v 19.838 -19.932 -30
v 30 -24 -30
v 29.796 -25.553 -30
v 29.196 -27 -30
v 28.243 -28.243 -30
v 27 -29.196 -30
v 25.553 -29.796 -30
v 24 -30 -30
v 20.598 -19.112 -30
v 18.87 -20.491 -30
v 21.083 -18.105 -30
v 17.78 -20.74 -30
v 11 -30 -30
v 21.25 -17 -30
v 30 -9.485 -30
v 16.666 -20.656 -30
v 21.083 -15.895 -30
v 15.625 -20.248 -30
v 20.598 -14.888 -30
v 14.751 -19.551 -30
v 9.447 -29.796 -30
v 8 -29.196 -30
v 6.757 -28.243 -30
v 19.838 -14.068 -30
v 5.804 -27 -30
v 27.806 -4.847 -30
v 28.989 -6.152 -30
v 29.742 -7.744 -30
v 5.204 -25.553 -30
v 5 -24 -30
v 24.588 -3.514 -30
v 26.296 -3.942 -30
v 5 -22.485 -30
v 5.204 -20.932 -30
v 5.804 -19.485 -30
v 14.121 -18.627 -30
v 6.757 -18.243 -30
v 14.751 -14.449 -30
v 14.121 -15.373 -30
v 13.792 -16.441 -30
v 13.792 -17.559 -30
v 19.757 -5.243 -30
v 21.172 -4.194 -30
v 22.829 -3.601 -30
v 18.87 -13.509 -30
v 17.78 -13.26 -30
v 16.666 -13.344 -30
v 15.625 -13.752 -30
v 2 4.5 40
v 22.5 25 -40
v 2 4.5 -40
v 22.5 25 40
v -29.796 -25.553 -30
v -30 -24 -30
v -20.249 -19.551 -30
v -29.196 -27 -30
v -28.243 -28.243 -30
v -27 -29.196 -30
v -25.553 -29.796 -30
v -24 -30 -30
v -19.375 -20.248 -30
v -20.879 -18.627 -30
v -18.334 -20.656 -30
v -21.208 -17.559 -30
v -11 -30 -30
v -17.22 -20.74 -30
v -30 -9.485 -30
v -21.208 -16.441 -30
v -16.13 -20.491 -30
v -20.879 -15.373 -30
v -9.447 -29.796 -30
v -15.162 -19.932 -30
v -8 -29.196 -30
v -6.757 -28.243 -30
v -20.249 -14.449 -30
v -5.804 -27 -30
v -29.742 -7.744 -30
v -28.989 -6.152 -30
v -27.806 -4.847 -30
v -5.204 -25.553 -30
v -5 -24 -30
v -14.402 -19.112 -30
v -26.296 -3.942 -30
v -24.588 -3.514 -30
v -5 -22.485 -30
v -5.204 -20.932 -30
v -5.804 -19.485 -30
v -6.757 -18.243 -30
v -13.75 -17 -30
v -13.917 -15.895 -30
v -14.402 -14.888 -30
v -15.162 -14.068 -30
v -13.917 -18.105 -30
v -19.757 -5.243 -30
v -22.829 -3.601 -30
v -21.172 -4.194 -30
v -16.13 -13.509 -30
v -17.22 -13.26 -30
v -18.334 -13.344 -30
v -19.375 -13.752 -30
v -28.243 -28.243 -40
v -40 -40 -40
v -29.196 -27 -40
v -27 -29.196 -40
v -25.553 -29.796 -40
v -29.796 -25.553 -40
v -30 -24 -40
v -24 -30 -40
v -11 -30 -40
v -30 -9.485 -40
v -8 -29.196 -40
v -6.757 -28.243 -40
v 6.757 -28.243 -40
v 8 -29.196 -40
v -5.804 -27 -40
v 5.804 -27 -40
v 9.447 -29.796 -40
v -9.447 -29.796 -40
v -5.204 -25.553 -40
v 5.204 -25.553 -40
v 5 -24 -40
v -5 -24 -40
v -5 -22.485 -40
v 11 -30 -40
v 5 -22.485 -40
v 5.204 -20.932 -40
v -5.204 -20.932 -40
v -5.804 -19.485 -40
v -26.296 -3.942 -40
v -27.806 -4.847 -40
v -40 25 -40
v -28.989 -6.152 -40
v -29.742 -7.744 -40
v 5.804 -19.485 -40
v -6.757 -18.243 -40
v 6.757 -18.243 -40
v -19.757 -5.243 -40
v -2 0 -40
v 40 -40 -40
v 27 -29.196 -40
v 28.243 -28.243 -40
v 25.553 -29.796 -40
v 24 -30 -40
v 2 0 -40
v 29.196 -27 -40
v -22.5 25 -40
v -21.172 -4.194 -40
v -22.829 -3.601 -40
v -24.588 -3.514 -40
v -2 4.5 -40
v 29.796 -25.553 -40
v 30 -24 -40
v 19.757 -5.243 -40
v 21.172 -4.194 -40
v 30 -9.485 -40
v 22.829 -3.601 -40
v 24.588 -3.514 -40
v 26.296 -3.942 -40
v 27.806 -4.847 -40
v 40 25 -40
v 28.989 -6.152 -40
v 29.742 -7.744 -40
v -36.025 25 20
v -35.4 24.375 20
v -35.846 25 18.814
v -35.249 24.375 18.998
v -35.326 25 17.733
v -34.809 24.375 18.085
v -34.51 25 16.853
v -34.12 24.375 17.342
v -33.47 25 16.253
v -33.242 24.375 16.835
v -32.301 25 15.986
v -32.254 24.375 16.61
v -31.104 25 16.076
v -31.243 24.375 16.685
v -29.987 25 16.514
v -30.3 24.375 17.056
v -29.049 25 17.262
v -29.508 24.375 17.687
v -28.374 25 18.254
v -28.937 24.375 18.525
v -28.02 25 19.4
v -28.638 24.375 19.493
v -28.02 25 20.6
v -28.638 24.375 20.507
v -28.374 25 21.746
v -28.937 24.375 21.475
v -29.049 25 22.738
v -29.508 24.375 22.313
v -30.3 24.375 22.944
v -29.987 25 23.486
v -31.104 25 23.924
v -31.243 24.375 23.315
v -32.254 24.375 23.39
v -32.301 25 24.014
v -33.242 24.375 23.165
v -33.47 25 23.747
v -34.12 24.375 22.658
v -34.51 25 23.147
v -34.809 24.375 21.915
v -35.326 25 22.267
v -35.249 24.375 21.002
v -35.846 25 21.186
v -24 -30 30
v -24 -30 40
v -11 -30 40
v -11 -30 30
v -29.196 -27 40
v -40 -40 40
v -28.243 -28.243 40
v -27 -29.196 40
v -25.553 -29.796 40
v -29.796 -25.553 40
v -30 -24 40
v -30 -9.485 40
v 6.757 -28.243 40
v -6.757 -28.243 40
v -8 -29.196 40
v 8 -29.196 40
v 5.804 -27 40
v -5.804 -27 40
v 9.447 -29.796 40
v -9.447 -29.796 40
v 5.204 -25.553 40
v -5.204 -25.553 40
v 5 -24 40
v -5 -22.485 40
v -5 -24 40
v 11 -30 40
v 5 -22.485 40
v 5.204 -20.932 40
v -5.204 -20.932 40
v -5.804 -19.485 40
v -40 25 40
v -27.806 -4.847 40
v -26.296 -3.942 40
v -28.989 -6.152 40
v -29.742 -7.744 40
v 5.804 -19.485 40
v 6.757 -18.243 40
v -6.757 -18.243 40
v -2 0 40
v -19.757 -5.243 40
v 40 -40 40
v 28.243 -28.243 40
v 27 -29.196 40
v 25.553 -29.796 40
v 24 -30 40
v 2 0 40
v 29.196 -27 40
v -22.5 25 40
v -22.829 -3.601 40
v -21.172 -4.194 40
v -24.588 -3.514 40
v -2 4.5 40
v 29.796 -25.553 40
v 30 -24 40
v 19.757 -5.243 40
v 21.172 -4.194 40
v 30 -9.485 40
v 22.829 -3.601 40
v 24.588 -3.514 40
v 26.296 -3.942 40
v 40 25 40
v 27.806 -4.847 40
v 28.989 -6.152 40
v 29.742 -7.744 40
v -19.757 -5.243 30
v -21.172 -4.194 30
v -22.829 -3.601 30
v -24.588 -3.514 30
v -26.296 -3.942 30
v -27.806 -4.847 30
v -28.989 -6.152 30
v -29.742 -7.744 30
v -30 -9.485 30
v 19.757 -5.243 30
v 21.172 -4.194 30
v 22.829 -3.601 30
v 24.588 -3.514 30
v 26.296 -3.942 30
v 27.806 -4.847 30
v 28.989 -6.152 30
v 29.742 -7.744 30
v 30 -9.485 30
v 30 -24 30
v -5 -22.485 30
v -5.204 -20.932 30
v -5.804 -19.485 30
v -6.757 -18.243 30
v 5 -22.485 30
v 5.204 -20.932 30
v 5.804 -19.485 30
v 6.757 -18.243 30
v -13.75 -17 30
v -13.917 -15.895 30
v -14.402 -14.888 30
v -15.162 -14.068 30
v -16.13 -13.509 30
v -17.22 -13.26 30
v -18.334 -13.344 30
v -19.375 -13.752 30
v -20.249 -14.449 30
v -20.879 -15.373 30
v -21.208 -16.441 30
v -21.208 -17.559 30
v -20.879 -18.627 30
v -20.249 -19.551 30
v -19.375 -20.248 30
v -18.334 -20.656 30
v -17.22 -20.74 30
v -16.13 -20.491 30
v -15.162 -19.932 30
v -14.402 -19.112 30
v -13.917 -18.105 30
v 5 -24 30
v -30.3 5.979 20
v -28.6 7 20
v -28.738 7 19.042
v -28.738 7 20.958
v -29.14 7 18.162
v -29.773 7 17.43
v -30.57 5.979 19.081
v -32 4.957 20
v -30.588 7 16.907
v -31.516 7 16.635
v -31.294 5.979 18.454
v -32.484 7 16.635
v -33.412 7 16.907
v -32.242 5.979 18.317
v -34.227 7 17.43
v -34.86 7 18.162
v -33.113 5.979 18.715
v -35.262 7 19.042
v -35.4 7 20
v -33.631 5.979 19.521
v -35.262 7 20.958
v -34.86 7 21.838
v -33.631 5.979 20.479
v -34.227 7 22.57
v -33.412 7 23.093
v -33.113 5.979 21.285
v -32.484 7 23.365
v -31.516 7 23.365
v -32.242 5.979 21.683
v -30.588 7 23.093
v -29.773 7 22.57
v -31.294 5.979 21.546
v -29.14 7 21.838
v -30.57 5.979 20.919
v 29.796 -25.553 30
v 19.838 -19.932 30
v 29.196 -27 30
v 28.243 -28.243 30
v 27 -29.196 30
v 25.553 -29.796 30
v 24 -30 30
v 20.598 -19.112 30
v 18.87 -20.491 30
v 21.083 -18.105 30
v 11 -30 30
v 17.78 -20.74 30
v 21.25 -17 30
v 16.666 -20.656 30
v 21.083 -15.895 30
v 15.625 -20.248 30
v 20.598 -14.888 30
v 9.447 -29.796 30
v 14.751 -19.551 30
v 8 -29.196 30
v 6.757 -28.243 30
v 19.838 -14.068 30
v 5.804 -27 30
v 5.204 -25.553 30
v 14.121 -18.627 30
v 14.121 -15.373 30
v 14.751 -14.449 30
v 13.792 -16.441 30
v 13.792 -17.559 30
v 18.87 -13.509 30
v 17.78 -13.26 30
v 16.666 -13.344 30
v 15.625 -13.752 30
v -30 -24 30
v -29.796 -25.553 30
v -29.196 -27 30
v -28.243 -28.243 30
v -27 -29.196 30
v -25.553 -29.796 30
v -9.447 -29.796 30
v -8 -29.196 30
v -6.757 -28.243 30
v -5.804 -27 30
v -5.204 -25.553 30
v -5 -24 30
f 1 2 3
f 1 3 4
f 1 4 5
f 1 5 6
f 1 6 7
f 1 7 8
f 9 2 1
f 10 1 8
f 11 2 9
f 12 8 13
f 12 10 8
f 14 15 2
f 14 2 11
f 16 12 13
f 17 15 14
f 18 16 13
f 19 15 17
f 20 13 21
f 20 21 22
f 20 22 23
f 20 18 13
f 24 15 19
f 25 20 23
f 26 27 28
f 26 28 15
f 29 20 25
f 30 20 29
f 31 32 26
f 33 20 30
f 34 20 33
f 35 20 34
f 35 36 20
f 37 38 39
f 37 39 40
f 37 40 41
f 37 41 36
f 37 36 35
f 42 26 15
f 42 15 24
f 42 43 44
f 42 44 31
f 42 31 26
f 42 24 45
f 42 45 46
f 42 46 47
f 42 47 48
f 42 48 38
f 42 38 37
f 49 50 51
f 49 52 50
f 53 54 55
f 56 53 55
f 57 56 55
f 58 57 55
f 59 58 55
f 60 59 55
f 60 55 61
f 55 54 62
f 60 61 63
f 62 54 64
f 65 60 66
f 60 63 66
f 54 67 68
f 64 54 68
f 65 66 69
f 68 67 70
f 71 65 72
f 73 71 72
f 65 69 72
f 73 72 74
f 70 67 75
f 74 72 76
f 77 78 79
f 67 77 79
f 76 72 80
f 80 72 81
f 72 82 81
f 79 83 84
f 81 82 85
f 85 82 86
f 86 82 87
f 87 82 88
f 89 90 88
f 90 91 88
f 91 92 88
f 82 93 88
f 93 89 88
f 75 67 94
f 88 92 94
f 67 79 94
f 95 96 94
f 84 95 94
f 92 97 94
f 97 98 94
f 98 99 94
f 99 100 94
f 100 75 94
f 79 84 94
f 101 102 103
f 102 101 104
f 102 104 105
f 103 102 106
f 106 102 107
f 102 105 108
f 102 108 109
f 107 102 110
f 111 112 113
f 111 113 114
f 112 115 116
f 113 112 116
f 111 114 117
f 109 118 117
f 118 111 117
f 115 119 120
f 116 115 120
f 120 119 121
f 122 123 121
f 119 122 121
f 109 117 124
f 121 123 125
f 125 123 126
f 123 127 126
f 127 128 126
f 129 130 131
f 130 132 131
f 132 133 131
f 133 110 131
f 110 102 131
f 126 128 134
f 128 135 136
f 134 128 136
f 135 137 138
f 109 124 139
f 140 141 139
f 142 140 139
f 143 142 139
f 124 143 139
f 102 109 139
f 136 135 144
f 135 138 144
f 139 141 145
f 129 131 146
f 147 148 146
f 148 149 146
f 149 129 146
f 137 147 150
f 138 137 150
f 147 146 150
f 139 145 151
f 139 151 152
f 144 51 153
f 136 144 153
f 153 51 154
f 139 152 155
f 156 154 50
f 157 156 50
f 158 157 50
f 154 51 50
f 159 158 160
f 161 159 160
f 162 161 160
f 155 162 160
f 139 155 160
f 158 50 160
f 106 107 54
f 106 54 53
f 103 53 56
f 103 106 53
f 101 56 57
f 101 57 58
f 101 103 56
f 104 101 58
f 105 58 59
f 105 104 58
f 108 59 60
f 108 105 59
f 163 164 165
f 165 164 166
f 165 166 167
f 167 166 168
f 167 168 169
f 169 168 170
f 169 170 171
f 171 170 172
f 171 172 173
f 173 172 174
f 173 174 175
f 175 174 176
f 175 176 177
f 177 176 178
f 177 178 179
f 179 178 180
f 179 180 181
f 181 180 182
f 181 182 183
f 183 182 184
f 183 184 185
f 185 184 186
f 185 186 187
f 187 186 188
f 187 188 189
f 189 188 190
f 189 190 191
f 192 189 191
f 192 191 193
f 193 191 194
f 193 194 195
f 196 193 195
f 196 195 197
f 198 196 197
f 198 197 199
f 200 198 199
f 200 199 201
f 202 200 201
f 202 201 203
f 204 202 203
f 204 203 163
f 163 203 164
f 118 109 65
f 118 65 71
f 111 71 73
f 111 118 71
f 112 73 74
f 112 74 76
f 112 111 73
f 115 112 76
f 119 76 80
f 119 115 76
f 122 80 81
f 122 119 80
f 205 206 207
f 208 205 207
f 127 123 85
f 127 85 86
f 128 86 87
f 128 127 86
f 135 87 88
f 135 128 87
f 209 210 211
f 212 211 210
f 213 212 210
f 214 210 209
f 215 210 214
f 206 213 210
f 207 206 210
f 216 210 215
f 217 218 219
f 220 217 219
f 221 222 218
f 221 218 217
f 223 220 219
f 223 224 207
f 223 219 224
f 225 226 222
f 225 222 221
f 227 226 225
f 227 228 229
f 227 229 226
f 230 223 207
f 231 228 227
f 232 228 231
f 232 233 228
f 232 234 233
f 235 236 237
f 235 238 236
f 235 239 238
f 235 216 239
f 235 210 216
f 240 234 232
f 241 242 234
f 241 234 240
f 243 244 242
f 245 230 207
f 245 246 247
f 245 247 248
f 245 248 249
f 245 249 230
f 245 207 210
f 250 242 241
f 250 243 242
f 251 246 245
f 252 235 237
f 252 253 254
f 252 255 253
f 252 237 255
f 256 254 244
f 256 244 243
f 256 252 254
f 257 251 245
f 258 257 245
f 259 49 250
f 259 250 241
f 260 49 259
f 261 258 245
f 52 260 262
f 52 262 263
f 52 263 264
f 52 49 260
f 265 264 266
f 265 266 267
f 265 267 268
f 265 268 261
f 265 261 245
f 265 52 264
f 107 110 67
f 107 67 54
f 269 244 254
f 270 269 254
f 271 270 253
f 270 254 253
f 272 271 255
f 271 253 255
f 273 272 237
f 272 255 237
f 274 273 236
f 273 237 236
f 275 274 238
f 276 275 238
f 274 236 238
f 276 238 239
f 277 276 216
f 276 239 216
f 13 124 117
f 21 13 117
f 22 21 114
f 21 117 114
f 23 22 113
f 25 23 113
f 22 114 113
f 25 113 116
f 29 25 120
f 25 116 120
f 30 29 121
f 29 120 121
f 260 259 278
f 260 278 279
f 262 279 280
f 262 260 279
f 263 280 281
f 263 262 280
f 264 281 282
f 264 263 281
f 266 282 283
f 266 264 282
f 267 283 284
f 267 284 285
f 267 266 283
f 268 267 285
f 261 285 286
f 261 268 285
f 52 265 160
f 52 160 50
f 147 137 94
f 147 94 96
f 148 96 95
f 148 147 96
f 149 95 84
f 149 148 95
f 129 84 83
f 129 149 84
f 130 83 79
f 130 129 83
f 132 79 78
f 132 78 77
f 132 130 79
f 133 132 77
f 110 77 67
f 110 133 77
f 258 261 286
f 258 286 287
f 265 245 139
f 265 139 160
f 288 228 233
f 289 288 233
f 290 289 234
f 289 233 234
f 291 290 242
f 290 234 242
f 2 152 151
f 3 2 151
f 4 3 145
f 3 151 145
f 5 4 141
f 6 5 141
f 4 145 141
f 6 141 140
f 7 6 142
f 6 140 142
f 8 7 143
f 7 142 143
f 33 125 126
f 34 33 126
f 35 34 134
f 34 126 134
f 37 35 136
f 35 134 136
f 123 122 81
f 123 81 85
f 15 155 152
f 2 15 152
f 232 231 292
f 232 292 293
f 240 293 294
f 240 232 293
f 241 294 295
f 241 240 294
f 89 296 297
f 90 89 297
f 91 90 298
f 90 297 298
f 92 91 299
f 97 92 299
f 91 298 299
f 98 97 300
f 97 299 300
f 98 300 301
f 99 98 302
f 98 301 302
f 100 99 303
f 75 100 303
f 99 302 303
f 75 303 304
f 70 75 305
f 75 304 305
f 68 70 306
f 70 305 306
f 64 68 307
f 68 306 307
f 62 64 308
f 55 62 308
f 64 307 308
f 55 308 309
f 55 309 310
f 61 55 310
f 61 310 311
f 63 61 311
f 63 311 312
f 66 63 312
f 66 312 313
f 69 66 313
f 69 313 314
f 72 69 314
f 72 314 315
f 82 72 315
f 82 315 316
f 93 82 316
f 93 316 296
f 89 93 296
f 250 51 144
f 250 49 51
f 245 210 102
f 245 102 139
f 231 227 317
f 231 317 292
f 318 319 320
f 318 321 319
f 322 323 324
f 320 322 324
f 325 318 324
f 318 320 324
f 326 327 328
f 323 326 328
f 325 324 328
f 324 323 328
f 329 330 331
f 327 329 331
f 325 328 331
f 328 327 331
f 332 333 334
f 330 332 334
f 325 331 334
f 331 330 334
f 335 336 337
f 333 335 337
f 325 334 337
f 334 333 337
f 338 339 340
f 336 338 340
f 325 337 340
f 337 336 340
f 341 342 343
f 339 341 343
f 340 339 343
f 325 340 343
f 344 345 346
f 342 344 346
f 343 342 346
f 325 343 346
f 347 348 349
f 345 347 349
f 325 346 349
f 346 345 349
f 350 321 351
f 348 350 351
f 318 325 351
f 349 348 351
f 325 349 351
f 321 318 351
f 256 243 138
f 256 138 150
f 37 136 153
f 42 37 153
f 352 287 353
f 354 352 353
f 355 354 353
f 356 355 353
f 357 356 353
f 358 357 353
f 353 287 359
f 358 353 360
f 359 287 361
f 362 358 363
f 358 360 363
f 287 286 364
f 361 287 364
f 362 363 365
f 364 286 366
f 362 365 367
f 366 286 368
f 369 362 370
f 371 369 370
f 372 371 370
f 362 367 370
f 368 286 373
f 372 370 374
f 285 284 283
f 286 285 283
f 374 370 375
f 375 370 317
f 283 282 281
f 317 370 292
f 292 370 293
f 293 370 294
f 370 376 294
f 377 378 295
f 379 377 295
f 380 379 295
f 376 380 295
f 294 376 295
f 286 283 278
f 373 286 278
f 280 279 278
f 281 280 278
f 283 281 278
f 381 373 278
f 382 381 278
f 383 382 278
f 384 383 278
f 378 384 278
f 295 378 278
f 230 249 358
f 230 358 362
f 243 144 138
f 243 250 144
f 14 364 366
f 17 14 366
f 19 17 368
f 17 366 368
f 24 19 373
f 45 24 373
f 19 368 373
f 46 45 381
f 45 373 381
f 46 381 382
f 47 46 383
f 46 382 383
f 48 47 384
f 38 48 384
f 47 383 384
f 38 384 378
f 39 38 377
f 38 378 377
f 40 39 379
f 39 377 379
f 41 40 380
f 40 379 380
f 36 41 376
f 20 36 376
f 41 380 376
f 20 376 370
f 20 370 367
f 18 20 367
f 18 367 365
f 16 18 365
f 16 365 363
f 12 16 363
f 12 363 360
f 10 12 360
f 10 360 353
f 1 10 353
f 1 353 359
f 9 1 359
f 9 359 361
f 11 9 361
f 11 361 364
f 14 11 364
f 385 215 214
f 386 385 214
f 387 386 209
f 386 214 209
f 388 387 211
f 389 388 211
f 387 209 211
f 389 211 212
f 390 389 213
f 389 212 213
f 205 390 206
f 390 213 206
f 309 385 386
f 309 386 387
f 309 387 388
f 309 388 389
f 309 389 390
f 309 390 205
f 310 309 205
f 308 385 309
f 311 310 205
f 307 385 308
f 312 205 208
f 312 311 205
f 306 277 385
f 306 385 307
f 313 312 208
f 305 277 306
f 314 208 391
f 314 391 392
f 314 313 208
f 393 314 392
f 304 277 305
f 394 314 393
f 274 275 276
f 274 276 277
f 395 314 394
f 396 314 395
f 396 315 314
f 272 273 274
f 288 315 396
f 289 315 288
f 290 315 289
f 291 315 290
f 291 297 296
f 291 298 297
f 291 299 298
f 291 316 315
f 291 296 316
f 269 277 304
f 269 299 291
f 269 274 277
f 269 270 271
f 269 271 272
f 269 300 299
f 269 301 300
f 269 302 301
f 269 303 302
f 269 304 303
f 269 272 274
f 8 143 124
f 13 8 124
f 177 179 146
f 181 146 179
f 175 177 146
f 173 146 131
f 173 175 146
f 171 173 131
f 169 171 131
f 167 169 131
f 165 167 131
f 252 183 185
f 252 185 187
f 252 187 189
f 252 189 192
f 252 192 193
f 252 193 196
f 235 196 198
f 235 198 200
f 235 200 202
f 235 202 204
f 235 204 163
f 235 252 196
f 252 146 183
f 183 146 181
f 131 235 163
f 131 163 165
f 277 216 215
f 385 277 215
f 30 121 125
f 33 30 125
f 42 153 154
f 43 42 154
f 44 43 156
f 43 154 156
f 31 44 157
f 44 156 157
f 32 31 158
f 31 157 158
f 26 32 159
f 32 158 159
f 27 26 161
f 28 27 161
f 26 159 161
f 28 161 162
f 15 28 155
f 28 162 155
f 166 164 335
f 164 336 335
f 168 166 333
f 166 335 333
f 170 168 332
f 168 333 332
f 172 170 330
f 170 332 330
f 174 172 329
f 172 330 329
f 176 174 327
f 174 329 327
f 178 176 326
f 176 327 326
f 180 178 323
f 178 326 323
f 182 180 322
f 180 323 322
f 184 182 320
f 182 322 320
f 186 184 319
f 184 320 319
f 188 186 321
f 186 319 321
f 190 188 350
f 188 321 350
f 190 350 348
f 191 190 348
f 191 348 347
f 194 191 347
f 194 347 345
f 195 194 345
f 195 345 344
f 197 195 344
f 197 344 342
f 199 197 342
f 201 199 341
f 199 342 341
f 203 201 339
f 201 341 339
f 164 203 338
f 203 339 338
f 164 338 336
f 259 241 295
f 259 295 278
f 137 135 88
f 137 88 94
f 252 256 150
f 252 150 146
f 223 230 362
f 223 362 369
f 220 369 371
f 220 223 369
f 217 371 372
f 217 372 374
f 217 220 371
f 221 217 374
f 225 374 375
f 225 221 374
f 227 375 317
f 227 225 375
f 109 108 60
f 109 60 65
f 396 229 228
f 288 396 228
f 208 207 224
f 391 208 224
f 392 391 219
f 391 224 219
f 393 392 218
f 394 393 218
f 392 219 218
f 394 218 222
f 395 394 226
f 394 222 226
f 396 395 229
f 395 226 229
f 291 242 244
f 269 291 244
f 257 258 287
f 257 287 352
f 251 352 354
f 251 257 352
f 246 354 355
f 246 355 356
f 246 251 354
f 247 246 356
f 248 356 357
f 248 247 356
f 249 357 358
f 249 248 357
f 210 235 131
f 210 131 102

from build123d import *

# Parameters (mm, degrees)
Y_KSEKLIK_EKSTR_ZYON1_DEPTH = 40
IZIM2_R                     = 3.75
KES_EKSTR_ZYON1_DEPTH       = 10
IZIM3_R                     = 3.75
KES_EKSTR_ZYON2_DEPTH       = 81
M8_DI_LI_DELIK1_D           = 6.8
M8_DI_LI_DELIK1_DEPTH       = 18
M8_DI_LI_DELIK1_CSINK_D     = 8.05
M8_DI_LI_DELIK1_CSINK_ANGLE = 90
M8_DI_LI_DELIK1_TIP         = 2.042926105


with BuildPart() as part:
    # Çizim1 → Yükseklik-Ekstrüzyon1 (new body, symmetric)
    with BuildSketch(Plane.XY):
        Polygon((2, 0), (-2, 0), (-2, 4.5), (-22.5, 25), (-40, 25), (-40, -40), (40, -40), (40, 25), (22.5, 25), (2, 4.5), align=None)
    extrude(amount=Y_KSEKLIK_EKSTR_ZYON1_DEPTH, both=True)

    # Çizim2 → Kes-Ekstrüzyon1 (cut)
    with BuildSketch(Plane.XY.offset(40)):
        with BuildLine():
            Line((30, -9.485281374), (30, -24))
            ThreePointArc((30, -24), (28.242640687, -28.242640687), (24, -30))
            Line((24, -30), (11, -30))
            ThreePointArc((11, -30), (6.757359313, -28.242640687), (5, -24))
            Line((5, -24), (5, -22.485281374))
            ThreePointArc((5, -22.485281374), (5.456722805, -20.18918078), (6.757359313, -18.242640687))
            Line((6.757359313, -18.242640687), (19.757359313, -5.242640687))
            ThreePointArc((19.757359313, -5.242640687), (26.296100594, -3.942004179), (30, -9.485281374))
        make_face()
        with Locations((17.5, -17)):
            Circle(IZIM2_R, mode=Mode.SUBTRACT)
        with BuildLine():
            Line((-24, -30), (-11, -30))
            ThreePointArc((-11, -30), (-6.757359313, -28.242640687), (-5, -24))
            Line((-5, -24), (-5, -22.485281374))
            ThreePointArc((-5, -22.485281374), (-5.456722805, -20.18918078), (-6.757359313, -18.242640687))
            Line((-6.757359313, -18.242640687), (-19.757359313, -5.242640687))
            ThreePointArc((-19.757359313, -5.242640687), (-26.296100594, -3.942004179), (-30, -9.485281374))
            Line((-30, -9.485281374), (-30, -24))
            ThreePointArc((-30, -24), (-28.242640687, -28.242640687), (-24, -30))
        make_face()
        with Locations((-17.5, -17)):
            Circle(IZIM2_R, mode=Mode.SUBTRACT)
    kes_ekstr_zyon1 = extrude(amount=-KES_EKSTR_ZYON1_DEPTH, mode=Mode.SUBTRACT)

    # Aynalama1: Kes-Ekstrüzyon1 across plane
    add(kes_ekstr_zyon1.mirror(Plane.XY), mode=Mode.SUBTRACT)

    # Çizim3 → Kes-Ekstrüzyon2 (cut, through all)
    with BuildSketch(Plane.XY.offset(40)):
        with Locations((-17.5, -17)):
            Circle(IZIM3_R)
        with Locations((17.5, -17)):
            Circle(IZIM3_R)
    extrude(amount=-KES_EKSTR_ZYON2_DEPTH, mode=Mode.SUBTRACT)

    # M8 Dişli Delik1
    with Locations(Plane(origin=(0, 25, 0), x_dir=(1, 0, 0), z_dir=(0, 1, 0))):
        with Locations((-32, -20)):
            CounterSinkHole(M8_DI_LI_DELIK1_D / 2, M8_DI_LI_DELIK1_CSINK_D / 2, depth=M8_DI_LI_DELIK1_DEPTH, counter_sink_angle=M8_DI_LI_DELIK1_CSINK_ANGLE)
            with Locations((0, 0, -(M8_DI_LI_DELIK1_DEPTH + M8_DI_LI_DELIK1_TIP / 2))):  # 118° drill point
                Cone(0, M8_DI_LI_DELIK1_D / 2, M8_DI_LI_DELIK1_TIP, mode=Mode.SUBTRACT)


solid = part.part
